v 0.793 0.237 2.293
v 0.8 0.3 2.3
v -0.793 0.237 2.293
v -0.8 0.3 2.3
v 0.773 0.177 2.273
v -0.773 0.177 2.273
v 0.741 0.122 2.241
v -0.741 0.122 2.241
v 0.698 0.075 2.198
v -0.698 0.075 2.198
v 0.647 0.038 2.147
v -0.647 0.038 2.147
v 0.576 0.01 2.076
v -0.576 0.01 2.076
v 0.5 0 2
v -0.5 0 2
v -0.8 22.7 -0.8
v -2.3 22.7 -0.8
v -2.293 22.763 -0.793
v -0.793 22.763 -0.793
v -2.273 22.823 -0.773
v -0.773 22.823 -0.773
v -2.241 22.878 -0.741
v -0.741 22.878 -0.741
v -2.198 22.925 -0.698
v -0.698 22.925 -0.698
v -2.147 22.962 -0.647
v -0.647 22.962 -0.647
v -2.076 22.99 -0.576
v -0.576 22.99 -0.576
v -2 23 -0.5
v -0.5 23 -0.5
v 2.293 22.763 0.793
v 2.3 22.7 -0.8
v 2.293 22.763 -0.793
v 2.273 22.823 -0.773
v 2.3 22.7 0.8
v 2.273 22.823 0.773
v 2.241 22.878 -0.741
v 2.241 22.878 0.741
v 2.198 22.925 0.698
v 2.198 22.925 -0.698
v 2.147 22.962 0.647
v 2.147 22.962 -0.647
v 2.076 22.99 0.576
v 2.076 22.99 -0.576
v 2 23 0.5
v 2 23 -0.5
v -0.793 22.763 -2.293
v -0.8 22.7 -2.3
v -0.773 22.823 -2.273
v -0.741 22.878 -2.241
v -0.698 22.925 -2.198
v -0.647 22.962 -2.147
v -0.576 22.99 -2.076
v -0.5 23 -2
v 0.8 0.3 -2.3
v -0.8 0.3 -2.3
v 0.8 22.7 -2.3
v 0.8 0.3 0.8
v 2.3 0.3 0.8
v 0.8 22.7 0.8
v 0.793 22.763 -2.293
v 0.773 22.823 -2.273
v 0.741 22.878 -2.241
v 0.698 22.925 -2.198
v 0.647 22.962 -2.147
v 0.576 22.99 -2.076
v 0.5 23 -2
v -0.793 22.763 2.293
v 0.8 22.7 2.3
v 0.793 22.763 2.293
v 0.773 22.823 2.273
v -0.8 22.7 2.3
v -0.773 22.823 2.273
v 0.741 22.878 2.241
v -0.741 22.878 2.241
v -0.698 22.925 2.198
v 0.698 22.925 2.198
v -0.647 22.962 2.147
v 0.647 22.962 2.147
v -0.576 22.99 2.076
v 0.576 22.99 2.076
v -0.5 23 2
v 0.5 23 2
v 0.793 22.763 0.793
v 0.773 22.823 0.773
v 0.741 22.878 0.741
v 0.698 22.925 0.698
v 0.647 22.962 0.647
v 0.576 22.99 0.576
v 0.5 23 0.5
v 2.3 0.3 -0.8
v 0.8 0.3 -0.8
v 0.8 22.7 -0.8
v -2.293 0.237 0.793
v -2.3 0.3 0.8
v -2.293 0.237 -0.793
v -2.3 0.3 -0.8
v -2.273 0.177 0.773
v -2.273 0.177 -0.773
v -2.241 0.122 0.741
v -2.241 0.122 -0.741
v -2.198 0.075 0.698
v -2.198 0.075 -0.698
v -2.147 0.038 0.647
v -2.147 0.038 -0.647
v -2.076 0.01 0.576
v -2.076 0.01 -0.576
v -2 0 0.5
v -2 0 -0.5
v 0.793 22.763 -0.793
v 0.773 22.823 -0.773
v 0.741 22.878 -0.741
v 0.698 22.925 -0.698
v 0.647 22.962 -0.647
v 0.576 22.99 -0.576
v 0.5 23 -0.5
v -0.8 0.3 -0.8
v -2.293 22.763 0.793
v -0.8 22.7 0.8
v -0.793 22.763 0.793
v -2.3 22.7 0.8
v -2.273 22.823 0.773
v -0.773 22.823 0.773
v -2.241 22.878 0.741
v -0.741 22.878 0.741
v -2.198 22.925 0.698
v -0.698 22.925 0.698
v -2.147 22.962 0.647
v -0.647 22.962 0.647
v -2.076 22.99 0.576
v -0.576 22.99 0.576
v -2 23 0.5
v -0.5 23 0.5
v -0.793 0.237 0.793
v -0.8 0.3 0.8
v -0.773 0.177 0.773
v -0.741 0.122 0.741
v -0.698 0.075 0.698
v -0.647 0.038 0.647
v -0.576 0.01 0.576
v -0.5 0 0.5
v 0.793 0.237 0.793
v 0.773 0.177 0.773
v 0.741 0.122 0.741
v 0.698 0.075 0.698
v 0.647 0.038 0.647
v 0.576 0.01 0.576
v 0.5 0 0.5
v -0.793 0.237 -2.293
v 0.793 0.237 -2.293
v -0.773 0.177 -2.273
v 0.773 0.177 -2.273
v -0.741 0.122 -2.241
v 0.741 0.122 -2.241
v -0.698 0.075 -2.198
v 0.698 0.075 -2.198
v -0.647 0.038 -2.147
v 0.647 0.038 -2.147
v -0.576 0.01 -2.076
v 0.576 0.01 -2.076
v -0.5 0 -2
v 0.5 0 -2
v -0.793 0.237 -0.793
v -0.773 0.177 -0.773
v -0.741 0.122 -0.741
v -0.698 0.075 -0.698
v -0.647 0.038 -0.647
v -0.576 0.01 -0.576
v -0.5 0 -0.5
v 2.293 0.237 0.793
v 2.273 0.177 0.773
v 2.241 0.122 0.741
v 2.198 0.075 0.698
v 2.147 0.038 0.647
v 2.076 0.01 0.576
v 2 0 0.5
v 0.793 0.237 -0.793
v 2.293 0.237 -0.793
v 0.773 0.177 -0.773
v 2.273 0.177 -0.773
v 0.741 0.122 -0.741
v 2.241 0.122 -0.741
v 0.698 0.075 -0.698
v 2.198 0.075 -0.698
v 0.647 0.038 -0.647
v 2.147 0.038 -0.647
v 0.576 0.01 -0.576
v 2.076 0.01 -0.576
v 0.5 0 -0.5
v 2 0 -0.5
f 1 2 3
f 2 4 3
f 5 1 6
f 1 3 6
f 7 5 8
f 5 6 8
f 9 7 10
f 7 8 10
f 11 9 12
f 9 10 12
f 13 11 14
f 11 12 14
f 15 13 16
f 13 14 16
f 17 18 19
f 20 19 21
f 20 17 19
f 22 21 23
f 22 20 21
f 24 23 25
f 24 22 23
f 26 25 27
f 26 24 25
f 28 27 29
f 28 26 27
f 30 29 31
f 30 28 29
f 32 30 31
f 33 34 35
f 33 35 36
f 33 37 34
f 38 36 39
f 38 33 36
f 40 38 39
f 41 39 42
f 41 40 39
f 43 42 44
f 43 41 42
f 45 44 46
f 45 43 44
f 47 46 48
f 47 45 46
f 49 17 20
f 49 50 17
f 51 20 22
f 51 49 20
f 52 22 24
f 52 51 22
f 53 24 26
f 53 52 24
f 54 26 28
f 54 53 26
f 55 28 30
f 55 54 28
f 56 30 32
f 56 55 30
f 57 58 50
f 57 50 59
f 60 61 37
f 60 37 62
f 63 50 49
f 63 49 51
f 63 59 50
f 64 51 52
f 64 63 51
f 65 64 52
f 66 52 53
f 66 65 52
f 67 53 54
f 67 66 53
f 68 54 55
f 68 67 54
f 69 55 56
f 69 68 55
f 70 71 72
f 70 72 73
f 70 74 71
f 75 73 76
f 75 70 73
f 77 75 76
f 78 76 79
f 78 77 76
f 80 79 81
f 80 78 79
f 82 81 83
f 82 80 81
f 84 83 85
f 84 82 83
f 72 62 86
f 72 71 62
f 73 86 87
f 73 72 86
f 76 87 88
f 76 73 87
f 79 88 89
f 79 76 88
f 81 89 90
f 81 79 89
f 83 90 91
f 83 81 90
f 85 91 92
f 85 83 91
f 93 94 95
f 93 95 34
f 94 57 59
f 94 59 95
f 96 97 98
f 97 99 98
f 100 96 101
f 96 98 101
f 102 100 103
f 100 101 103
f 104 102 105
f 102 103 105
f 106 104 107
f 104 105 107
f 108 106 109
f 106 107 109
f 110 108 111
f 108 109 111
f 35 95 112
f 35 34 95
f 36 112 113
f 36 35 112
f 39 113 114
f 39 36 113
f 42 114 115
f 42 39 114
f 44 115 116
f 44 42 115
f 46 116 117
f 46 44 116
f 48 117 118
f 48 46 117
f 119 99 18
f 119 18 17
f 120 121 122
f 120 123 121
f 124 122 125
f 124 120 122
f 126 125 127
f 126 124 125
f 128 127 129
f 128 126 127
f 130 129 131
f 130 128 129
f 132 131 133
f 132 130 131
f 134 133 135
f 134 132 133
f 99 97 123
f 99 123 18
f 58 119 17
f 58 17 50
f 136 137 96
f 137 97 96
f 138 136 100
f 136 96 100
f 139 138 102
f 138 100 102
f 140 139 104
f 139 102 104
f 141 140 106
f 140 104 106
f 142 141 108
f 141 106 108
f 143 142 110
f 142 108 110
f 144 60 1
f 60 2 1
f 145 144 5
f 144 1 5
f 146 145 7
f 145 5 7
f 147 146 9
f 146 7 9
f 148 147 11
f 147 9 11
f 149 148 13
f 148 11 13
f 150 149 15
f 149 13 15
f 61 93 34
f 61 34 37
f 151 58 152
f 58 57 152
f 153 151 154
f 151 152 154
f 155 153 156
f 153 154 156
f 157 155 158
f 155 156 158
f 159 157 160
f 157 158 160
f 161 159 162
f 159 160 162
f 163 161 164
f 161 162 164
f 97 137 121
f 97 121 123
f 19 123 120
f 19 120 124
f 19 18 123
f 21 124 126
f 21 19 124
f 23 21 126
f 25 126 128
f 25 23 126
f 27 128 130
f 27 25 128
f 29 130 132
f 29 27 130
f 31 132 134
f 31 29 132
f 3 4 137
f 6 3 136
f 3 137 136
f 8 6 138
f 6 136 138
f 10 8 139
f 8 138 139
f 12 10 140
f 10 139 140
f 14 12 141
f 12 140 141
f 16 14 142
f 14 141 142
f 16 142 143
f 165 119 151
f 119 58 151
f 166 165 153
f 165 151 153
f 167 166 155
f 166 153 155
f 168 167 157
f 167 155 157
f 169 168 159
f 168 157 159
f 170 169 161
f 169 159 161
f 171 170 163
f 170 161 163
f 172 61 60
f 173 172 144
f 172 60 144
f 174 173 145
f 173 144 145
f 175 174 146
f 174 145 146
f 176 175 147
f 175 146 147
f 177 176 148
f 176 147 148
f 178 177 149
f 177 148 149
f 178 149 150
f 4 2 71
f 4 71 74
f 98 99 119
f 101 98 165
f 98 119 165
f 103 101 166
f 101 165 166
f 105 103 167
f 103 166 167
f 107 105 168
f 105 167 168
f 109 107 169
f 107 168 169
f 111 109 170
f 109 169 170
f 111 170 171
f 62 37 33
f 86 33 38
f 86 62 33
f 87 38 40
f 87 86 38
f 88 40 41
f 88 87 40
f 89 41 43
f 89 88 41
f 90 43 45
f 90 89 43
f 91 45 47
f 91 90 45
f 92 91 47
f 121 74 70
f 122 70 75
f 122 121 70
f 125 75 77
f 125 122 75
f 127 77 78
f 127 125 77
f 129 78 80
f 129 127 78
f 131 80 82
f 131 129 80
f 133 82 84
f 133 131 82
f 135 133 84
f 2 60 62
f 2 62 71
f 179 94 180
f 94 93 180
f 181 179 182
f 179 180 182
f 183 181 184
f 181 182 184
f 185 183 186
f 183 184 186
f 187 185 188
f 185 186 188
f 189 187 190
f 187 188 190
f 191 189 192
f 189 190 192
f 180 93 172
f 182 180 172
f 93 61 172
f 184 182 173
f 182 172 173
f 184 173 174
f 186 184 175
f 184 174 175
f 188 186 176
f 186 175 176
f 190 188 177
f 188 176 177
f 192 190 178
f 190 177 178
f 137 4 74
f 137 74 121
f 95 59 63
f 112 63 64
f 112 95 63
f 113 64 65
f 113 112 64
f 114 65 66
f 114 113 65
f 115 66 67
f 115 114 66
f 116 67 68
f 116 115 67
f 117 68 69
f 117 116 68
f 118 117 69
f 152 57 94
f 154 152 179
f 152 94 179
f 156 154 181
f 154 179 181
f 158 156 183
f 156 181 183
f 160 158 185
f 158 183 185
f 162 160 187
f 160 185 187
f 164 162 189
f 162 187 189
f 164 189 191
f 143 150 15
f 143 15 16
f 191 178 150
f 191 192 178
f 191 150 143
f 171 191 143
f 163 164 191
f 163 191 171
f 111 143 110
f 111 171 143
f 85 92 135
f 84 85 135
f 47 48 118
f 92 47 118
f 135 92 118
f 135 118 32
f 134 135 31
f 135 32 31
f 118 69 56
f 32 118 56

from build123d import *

# Parameters (mm, degrees)
BOSS_EXTRUDE1_DEPTH = 23
FILLET1_R           = 0.3


with BuildPart() as part:
    # Sketch1 → Boss-Extrude1 (new body)
    with BuildSketch(Plane(origin=(0, 0, 0), x_dir=(1, 0, 0), z_dir=(0, 1, 0))):
        Polygon((0.8, 0.8), (2.3, 0.8), (2.3, -0.8), (0.8, -0.8), (0.8, -2.3), (-0.8, -2.3), (-0.8, -0.8), (-2.3, -0.8), (-2.3, 0.8), (-0.8, 0.8), (-0.8, 2.3), (0.8, 2.3), align=None)
    extrude(amount=BOSS_EXTRUDE1_DEPTH)

    # Fillet1
    fillet1_edges = [part.edges().sort_by_distance(p)[0] for p in [
        (1.55, 0, 0.8),
        (0.8, 0, 1.55),
        (0.8, 23, -1.55),
        (0, 0, 2.3),
        (-0.8, 0, 1.55),
        (-1.55, 0, 0.8),
        (-2.3, 0, 0),
        (-1.55, 0, -0.8),
        (-0.8, 0, -1.55),
        (0, 0, -2.3),
        (0.8, 0, -1.55),
        (1.55, 0, -0.8),
        (2.3, 0, 0),
        (0, 23, -2.3),
        (-0.8, 23, -1.55),
        (-1.55, 23, -0.8),
        (-2.3, 23, 0),
        (-1.55, 23, 0.8),
        (-0.8, 23, 1.55),
        (0, 23, 2.3),
        (0.8, 23, 1.55),
        (1.55, 23, 0.8),
        (2.3, 23, 0),
        (1.55, 23, -0.8),
    ]]
    fillet(fillet1_edges, radius=FILLET1_R)


solid = part.part
